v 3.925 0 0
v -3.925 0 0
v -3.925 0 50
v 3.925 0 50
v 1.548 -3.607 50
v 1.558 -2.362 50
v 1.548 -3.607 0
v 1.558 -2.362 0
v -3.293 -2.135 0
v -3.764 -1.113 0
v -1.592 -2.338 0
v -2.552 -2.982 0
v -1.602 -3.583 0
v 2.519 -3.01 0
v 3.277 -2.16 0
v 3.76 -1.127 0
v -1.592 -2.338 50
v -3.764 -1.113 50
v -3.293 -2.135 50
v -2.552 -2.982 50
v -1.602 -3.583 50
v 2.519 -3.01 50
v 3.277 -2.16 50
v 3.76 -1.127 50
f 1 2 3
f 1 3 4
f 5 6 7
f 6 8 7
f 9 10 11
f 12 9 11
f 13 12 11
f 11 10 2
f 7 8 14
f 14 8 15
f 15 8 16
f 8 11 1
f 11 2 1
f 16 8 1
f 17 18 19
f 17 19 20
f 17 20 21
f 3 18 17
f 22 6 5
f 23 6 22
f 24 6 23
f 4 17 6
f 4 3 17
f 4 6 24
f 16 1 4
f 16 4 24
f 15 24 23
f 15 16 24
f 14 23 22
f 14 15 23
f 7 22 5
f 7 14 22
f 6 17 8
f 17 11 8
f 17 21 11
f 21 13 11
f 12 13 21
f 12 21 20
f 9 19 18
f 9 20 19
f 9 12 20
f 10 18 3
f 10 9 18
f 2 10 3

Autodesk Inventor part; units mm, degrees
ref_plane "YZ Plane" through (0, 0, 0) normal (1, 0, 0) x (0, 1, 0)
ref_plane "XZ Plane" through (0, 0, 0) normal (0, 1, 0) x (-1, 0, 0)
ref_plane "XY Plane" through (0, 0, 0) normal (0, 0, 1) x (1, 0, 0)
sketch "Sketch1" plane through (0, 0, 0) normal (0, 0, 1) x (1, 0, 0)
  line L0 (1.5575, -2.3616) -> (1.5482, -3.6067)
  line L1 (-1.5924, -2.3382) -> (1.5575, -2.3616)
  line L2 (-1.6017, -3.5833) -> (-1.5924, -2.3382)
  arc A0 (-1.5482, 3.6067) -> (-1.6017, -3.5833) centre (0, 0) ccw
  line L3 (-1.5575, 2.3616) -> (-1.5482, 3.6067)
  line L4 (1.5924, 2.3382) -> (-1.5575, 2.3616)
  line L5 (1.6017, 3.5833) -> (1.5924, 2.3382)
  arc A1 (1.5482, -3.6067) -> (1.6017, 3.5833) centre (0, 0) ccw
  point P0 (0, 0)
extrude "Extrusion1" add sketch "Sketch1" along normal blind 50
sketch "Sketch2" plane through (0, 0, 0) normal (0, 0, -1) x (-1, 0, 0)
  line L0 (-25, 13) -> (13, 13)
  line L1 (13, 13) -> (13, 0)
  line L2 (13, 0) -> (-25, 0)
  line L3 (-25, 0) -> (-25, 13)
  point P0 (0, 0)
extrude "Extrusion2" cut sketch "Sketch2" against normal blind 89.5
properties part number "Long_axel"
